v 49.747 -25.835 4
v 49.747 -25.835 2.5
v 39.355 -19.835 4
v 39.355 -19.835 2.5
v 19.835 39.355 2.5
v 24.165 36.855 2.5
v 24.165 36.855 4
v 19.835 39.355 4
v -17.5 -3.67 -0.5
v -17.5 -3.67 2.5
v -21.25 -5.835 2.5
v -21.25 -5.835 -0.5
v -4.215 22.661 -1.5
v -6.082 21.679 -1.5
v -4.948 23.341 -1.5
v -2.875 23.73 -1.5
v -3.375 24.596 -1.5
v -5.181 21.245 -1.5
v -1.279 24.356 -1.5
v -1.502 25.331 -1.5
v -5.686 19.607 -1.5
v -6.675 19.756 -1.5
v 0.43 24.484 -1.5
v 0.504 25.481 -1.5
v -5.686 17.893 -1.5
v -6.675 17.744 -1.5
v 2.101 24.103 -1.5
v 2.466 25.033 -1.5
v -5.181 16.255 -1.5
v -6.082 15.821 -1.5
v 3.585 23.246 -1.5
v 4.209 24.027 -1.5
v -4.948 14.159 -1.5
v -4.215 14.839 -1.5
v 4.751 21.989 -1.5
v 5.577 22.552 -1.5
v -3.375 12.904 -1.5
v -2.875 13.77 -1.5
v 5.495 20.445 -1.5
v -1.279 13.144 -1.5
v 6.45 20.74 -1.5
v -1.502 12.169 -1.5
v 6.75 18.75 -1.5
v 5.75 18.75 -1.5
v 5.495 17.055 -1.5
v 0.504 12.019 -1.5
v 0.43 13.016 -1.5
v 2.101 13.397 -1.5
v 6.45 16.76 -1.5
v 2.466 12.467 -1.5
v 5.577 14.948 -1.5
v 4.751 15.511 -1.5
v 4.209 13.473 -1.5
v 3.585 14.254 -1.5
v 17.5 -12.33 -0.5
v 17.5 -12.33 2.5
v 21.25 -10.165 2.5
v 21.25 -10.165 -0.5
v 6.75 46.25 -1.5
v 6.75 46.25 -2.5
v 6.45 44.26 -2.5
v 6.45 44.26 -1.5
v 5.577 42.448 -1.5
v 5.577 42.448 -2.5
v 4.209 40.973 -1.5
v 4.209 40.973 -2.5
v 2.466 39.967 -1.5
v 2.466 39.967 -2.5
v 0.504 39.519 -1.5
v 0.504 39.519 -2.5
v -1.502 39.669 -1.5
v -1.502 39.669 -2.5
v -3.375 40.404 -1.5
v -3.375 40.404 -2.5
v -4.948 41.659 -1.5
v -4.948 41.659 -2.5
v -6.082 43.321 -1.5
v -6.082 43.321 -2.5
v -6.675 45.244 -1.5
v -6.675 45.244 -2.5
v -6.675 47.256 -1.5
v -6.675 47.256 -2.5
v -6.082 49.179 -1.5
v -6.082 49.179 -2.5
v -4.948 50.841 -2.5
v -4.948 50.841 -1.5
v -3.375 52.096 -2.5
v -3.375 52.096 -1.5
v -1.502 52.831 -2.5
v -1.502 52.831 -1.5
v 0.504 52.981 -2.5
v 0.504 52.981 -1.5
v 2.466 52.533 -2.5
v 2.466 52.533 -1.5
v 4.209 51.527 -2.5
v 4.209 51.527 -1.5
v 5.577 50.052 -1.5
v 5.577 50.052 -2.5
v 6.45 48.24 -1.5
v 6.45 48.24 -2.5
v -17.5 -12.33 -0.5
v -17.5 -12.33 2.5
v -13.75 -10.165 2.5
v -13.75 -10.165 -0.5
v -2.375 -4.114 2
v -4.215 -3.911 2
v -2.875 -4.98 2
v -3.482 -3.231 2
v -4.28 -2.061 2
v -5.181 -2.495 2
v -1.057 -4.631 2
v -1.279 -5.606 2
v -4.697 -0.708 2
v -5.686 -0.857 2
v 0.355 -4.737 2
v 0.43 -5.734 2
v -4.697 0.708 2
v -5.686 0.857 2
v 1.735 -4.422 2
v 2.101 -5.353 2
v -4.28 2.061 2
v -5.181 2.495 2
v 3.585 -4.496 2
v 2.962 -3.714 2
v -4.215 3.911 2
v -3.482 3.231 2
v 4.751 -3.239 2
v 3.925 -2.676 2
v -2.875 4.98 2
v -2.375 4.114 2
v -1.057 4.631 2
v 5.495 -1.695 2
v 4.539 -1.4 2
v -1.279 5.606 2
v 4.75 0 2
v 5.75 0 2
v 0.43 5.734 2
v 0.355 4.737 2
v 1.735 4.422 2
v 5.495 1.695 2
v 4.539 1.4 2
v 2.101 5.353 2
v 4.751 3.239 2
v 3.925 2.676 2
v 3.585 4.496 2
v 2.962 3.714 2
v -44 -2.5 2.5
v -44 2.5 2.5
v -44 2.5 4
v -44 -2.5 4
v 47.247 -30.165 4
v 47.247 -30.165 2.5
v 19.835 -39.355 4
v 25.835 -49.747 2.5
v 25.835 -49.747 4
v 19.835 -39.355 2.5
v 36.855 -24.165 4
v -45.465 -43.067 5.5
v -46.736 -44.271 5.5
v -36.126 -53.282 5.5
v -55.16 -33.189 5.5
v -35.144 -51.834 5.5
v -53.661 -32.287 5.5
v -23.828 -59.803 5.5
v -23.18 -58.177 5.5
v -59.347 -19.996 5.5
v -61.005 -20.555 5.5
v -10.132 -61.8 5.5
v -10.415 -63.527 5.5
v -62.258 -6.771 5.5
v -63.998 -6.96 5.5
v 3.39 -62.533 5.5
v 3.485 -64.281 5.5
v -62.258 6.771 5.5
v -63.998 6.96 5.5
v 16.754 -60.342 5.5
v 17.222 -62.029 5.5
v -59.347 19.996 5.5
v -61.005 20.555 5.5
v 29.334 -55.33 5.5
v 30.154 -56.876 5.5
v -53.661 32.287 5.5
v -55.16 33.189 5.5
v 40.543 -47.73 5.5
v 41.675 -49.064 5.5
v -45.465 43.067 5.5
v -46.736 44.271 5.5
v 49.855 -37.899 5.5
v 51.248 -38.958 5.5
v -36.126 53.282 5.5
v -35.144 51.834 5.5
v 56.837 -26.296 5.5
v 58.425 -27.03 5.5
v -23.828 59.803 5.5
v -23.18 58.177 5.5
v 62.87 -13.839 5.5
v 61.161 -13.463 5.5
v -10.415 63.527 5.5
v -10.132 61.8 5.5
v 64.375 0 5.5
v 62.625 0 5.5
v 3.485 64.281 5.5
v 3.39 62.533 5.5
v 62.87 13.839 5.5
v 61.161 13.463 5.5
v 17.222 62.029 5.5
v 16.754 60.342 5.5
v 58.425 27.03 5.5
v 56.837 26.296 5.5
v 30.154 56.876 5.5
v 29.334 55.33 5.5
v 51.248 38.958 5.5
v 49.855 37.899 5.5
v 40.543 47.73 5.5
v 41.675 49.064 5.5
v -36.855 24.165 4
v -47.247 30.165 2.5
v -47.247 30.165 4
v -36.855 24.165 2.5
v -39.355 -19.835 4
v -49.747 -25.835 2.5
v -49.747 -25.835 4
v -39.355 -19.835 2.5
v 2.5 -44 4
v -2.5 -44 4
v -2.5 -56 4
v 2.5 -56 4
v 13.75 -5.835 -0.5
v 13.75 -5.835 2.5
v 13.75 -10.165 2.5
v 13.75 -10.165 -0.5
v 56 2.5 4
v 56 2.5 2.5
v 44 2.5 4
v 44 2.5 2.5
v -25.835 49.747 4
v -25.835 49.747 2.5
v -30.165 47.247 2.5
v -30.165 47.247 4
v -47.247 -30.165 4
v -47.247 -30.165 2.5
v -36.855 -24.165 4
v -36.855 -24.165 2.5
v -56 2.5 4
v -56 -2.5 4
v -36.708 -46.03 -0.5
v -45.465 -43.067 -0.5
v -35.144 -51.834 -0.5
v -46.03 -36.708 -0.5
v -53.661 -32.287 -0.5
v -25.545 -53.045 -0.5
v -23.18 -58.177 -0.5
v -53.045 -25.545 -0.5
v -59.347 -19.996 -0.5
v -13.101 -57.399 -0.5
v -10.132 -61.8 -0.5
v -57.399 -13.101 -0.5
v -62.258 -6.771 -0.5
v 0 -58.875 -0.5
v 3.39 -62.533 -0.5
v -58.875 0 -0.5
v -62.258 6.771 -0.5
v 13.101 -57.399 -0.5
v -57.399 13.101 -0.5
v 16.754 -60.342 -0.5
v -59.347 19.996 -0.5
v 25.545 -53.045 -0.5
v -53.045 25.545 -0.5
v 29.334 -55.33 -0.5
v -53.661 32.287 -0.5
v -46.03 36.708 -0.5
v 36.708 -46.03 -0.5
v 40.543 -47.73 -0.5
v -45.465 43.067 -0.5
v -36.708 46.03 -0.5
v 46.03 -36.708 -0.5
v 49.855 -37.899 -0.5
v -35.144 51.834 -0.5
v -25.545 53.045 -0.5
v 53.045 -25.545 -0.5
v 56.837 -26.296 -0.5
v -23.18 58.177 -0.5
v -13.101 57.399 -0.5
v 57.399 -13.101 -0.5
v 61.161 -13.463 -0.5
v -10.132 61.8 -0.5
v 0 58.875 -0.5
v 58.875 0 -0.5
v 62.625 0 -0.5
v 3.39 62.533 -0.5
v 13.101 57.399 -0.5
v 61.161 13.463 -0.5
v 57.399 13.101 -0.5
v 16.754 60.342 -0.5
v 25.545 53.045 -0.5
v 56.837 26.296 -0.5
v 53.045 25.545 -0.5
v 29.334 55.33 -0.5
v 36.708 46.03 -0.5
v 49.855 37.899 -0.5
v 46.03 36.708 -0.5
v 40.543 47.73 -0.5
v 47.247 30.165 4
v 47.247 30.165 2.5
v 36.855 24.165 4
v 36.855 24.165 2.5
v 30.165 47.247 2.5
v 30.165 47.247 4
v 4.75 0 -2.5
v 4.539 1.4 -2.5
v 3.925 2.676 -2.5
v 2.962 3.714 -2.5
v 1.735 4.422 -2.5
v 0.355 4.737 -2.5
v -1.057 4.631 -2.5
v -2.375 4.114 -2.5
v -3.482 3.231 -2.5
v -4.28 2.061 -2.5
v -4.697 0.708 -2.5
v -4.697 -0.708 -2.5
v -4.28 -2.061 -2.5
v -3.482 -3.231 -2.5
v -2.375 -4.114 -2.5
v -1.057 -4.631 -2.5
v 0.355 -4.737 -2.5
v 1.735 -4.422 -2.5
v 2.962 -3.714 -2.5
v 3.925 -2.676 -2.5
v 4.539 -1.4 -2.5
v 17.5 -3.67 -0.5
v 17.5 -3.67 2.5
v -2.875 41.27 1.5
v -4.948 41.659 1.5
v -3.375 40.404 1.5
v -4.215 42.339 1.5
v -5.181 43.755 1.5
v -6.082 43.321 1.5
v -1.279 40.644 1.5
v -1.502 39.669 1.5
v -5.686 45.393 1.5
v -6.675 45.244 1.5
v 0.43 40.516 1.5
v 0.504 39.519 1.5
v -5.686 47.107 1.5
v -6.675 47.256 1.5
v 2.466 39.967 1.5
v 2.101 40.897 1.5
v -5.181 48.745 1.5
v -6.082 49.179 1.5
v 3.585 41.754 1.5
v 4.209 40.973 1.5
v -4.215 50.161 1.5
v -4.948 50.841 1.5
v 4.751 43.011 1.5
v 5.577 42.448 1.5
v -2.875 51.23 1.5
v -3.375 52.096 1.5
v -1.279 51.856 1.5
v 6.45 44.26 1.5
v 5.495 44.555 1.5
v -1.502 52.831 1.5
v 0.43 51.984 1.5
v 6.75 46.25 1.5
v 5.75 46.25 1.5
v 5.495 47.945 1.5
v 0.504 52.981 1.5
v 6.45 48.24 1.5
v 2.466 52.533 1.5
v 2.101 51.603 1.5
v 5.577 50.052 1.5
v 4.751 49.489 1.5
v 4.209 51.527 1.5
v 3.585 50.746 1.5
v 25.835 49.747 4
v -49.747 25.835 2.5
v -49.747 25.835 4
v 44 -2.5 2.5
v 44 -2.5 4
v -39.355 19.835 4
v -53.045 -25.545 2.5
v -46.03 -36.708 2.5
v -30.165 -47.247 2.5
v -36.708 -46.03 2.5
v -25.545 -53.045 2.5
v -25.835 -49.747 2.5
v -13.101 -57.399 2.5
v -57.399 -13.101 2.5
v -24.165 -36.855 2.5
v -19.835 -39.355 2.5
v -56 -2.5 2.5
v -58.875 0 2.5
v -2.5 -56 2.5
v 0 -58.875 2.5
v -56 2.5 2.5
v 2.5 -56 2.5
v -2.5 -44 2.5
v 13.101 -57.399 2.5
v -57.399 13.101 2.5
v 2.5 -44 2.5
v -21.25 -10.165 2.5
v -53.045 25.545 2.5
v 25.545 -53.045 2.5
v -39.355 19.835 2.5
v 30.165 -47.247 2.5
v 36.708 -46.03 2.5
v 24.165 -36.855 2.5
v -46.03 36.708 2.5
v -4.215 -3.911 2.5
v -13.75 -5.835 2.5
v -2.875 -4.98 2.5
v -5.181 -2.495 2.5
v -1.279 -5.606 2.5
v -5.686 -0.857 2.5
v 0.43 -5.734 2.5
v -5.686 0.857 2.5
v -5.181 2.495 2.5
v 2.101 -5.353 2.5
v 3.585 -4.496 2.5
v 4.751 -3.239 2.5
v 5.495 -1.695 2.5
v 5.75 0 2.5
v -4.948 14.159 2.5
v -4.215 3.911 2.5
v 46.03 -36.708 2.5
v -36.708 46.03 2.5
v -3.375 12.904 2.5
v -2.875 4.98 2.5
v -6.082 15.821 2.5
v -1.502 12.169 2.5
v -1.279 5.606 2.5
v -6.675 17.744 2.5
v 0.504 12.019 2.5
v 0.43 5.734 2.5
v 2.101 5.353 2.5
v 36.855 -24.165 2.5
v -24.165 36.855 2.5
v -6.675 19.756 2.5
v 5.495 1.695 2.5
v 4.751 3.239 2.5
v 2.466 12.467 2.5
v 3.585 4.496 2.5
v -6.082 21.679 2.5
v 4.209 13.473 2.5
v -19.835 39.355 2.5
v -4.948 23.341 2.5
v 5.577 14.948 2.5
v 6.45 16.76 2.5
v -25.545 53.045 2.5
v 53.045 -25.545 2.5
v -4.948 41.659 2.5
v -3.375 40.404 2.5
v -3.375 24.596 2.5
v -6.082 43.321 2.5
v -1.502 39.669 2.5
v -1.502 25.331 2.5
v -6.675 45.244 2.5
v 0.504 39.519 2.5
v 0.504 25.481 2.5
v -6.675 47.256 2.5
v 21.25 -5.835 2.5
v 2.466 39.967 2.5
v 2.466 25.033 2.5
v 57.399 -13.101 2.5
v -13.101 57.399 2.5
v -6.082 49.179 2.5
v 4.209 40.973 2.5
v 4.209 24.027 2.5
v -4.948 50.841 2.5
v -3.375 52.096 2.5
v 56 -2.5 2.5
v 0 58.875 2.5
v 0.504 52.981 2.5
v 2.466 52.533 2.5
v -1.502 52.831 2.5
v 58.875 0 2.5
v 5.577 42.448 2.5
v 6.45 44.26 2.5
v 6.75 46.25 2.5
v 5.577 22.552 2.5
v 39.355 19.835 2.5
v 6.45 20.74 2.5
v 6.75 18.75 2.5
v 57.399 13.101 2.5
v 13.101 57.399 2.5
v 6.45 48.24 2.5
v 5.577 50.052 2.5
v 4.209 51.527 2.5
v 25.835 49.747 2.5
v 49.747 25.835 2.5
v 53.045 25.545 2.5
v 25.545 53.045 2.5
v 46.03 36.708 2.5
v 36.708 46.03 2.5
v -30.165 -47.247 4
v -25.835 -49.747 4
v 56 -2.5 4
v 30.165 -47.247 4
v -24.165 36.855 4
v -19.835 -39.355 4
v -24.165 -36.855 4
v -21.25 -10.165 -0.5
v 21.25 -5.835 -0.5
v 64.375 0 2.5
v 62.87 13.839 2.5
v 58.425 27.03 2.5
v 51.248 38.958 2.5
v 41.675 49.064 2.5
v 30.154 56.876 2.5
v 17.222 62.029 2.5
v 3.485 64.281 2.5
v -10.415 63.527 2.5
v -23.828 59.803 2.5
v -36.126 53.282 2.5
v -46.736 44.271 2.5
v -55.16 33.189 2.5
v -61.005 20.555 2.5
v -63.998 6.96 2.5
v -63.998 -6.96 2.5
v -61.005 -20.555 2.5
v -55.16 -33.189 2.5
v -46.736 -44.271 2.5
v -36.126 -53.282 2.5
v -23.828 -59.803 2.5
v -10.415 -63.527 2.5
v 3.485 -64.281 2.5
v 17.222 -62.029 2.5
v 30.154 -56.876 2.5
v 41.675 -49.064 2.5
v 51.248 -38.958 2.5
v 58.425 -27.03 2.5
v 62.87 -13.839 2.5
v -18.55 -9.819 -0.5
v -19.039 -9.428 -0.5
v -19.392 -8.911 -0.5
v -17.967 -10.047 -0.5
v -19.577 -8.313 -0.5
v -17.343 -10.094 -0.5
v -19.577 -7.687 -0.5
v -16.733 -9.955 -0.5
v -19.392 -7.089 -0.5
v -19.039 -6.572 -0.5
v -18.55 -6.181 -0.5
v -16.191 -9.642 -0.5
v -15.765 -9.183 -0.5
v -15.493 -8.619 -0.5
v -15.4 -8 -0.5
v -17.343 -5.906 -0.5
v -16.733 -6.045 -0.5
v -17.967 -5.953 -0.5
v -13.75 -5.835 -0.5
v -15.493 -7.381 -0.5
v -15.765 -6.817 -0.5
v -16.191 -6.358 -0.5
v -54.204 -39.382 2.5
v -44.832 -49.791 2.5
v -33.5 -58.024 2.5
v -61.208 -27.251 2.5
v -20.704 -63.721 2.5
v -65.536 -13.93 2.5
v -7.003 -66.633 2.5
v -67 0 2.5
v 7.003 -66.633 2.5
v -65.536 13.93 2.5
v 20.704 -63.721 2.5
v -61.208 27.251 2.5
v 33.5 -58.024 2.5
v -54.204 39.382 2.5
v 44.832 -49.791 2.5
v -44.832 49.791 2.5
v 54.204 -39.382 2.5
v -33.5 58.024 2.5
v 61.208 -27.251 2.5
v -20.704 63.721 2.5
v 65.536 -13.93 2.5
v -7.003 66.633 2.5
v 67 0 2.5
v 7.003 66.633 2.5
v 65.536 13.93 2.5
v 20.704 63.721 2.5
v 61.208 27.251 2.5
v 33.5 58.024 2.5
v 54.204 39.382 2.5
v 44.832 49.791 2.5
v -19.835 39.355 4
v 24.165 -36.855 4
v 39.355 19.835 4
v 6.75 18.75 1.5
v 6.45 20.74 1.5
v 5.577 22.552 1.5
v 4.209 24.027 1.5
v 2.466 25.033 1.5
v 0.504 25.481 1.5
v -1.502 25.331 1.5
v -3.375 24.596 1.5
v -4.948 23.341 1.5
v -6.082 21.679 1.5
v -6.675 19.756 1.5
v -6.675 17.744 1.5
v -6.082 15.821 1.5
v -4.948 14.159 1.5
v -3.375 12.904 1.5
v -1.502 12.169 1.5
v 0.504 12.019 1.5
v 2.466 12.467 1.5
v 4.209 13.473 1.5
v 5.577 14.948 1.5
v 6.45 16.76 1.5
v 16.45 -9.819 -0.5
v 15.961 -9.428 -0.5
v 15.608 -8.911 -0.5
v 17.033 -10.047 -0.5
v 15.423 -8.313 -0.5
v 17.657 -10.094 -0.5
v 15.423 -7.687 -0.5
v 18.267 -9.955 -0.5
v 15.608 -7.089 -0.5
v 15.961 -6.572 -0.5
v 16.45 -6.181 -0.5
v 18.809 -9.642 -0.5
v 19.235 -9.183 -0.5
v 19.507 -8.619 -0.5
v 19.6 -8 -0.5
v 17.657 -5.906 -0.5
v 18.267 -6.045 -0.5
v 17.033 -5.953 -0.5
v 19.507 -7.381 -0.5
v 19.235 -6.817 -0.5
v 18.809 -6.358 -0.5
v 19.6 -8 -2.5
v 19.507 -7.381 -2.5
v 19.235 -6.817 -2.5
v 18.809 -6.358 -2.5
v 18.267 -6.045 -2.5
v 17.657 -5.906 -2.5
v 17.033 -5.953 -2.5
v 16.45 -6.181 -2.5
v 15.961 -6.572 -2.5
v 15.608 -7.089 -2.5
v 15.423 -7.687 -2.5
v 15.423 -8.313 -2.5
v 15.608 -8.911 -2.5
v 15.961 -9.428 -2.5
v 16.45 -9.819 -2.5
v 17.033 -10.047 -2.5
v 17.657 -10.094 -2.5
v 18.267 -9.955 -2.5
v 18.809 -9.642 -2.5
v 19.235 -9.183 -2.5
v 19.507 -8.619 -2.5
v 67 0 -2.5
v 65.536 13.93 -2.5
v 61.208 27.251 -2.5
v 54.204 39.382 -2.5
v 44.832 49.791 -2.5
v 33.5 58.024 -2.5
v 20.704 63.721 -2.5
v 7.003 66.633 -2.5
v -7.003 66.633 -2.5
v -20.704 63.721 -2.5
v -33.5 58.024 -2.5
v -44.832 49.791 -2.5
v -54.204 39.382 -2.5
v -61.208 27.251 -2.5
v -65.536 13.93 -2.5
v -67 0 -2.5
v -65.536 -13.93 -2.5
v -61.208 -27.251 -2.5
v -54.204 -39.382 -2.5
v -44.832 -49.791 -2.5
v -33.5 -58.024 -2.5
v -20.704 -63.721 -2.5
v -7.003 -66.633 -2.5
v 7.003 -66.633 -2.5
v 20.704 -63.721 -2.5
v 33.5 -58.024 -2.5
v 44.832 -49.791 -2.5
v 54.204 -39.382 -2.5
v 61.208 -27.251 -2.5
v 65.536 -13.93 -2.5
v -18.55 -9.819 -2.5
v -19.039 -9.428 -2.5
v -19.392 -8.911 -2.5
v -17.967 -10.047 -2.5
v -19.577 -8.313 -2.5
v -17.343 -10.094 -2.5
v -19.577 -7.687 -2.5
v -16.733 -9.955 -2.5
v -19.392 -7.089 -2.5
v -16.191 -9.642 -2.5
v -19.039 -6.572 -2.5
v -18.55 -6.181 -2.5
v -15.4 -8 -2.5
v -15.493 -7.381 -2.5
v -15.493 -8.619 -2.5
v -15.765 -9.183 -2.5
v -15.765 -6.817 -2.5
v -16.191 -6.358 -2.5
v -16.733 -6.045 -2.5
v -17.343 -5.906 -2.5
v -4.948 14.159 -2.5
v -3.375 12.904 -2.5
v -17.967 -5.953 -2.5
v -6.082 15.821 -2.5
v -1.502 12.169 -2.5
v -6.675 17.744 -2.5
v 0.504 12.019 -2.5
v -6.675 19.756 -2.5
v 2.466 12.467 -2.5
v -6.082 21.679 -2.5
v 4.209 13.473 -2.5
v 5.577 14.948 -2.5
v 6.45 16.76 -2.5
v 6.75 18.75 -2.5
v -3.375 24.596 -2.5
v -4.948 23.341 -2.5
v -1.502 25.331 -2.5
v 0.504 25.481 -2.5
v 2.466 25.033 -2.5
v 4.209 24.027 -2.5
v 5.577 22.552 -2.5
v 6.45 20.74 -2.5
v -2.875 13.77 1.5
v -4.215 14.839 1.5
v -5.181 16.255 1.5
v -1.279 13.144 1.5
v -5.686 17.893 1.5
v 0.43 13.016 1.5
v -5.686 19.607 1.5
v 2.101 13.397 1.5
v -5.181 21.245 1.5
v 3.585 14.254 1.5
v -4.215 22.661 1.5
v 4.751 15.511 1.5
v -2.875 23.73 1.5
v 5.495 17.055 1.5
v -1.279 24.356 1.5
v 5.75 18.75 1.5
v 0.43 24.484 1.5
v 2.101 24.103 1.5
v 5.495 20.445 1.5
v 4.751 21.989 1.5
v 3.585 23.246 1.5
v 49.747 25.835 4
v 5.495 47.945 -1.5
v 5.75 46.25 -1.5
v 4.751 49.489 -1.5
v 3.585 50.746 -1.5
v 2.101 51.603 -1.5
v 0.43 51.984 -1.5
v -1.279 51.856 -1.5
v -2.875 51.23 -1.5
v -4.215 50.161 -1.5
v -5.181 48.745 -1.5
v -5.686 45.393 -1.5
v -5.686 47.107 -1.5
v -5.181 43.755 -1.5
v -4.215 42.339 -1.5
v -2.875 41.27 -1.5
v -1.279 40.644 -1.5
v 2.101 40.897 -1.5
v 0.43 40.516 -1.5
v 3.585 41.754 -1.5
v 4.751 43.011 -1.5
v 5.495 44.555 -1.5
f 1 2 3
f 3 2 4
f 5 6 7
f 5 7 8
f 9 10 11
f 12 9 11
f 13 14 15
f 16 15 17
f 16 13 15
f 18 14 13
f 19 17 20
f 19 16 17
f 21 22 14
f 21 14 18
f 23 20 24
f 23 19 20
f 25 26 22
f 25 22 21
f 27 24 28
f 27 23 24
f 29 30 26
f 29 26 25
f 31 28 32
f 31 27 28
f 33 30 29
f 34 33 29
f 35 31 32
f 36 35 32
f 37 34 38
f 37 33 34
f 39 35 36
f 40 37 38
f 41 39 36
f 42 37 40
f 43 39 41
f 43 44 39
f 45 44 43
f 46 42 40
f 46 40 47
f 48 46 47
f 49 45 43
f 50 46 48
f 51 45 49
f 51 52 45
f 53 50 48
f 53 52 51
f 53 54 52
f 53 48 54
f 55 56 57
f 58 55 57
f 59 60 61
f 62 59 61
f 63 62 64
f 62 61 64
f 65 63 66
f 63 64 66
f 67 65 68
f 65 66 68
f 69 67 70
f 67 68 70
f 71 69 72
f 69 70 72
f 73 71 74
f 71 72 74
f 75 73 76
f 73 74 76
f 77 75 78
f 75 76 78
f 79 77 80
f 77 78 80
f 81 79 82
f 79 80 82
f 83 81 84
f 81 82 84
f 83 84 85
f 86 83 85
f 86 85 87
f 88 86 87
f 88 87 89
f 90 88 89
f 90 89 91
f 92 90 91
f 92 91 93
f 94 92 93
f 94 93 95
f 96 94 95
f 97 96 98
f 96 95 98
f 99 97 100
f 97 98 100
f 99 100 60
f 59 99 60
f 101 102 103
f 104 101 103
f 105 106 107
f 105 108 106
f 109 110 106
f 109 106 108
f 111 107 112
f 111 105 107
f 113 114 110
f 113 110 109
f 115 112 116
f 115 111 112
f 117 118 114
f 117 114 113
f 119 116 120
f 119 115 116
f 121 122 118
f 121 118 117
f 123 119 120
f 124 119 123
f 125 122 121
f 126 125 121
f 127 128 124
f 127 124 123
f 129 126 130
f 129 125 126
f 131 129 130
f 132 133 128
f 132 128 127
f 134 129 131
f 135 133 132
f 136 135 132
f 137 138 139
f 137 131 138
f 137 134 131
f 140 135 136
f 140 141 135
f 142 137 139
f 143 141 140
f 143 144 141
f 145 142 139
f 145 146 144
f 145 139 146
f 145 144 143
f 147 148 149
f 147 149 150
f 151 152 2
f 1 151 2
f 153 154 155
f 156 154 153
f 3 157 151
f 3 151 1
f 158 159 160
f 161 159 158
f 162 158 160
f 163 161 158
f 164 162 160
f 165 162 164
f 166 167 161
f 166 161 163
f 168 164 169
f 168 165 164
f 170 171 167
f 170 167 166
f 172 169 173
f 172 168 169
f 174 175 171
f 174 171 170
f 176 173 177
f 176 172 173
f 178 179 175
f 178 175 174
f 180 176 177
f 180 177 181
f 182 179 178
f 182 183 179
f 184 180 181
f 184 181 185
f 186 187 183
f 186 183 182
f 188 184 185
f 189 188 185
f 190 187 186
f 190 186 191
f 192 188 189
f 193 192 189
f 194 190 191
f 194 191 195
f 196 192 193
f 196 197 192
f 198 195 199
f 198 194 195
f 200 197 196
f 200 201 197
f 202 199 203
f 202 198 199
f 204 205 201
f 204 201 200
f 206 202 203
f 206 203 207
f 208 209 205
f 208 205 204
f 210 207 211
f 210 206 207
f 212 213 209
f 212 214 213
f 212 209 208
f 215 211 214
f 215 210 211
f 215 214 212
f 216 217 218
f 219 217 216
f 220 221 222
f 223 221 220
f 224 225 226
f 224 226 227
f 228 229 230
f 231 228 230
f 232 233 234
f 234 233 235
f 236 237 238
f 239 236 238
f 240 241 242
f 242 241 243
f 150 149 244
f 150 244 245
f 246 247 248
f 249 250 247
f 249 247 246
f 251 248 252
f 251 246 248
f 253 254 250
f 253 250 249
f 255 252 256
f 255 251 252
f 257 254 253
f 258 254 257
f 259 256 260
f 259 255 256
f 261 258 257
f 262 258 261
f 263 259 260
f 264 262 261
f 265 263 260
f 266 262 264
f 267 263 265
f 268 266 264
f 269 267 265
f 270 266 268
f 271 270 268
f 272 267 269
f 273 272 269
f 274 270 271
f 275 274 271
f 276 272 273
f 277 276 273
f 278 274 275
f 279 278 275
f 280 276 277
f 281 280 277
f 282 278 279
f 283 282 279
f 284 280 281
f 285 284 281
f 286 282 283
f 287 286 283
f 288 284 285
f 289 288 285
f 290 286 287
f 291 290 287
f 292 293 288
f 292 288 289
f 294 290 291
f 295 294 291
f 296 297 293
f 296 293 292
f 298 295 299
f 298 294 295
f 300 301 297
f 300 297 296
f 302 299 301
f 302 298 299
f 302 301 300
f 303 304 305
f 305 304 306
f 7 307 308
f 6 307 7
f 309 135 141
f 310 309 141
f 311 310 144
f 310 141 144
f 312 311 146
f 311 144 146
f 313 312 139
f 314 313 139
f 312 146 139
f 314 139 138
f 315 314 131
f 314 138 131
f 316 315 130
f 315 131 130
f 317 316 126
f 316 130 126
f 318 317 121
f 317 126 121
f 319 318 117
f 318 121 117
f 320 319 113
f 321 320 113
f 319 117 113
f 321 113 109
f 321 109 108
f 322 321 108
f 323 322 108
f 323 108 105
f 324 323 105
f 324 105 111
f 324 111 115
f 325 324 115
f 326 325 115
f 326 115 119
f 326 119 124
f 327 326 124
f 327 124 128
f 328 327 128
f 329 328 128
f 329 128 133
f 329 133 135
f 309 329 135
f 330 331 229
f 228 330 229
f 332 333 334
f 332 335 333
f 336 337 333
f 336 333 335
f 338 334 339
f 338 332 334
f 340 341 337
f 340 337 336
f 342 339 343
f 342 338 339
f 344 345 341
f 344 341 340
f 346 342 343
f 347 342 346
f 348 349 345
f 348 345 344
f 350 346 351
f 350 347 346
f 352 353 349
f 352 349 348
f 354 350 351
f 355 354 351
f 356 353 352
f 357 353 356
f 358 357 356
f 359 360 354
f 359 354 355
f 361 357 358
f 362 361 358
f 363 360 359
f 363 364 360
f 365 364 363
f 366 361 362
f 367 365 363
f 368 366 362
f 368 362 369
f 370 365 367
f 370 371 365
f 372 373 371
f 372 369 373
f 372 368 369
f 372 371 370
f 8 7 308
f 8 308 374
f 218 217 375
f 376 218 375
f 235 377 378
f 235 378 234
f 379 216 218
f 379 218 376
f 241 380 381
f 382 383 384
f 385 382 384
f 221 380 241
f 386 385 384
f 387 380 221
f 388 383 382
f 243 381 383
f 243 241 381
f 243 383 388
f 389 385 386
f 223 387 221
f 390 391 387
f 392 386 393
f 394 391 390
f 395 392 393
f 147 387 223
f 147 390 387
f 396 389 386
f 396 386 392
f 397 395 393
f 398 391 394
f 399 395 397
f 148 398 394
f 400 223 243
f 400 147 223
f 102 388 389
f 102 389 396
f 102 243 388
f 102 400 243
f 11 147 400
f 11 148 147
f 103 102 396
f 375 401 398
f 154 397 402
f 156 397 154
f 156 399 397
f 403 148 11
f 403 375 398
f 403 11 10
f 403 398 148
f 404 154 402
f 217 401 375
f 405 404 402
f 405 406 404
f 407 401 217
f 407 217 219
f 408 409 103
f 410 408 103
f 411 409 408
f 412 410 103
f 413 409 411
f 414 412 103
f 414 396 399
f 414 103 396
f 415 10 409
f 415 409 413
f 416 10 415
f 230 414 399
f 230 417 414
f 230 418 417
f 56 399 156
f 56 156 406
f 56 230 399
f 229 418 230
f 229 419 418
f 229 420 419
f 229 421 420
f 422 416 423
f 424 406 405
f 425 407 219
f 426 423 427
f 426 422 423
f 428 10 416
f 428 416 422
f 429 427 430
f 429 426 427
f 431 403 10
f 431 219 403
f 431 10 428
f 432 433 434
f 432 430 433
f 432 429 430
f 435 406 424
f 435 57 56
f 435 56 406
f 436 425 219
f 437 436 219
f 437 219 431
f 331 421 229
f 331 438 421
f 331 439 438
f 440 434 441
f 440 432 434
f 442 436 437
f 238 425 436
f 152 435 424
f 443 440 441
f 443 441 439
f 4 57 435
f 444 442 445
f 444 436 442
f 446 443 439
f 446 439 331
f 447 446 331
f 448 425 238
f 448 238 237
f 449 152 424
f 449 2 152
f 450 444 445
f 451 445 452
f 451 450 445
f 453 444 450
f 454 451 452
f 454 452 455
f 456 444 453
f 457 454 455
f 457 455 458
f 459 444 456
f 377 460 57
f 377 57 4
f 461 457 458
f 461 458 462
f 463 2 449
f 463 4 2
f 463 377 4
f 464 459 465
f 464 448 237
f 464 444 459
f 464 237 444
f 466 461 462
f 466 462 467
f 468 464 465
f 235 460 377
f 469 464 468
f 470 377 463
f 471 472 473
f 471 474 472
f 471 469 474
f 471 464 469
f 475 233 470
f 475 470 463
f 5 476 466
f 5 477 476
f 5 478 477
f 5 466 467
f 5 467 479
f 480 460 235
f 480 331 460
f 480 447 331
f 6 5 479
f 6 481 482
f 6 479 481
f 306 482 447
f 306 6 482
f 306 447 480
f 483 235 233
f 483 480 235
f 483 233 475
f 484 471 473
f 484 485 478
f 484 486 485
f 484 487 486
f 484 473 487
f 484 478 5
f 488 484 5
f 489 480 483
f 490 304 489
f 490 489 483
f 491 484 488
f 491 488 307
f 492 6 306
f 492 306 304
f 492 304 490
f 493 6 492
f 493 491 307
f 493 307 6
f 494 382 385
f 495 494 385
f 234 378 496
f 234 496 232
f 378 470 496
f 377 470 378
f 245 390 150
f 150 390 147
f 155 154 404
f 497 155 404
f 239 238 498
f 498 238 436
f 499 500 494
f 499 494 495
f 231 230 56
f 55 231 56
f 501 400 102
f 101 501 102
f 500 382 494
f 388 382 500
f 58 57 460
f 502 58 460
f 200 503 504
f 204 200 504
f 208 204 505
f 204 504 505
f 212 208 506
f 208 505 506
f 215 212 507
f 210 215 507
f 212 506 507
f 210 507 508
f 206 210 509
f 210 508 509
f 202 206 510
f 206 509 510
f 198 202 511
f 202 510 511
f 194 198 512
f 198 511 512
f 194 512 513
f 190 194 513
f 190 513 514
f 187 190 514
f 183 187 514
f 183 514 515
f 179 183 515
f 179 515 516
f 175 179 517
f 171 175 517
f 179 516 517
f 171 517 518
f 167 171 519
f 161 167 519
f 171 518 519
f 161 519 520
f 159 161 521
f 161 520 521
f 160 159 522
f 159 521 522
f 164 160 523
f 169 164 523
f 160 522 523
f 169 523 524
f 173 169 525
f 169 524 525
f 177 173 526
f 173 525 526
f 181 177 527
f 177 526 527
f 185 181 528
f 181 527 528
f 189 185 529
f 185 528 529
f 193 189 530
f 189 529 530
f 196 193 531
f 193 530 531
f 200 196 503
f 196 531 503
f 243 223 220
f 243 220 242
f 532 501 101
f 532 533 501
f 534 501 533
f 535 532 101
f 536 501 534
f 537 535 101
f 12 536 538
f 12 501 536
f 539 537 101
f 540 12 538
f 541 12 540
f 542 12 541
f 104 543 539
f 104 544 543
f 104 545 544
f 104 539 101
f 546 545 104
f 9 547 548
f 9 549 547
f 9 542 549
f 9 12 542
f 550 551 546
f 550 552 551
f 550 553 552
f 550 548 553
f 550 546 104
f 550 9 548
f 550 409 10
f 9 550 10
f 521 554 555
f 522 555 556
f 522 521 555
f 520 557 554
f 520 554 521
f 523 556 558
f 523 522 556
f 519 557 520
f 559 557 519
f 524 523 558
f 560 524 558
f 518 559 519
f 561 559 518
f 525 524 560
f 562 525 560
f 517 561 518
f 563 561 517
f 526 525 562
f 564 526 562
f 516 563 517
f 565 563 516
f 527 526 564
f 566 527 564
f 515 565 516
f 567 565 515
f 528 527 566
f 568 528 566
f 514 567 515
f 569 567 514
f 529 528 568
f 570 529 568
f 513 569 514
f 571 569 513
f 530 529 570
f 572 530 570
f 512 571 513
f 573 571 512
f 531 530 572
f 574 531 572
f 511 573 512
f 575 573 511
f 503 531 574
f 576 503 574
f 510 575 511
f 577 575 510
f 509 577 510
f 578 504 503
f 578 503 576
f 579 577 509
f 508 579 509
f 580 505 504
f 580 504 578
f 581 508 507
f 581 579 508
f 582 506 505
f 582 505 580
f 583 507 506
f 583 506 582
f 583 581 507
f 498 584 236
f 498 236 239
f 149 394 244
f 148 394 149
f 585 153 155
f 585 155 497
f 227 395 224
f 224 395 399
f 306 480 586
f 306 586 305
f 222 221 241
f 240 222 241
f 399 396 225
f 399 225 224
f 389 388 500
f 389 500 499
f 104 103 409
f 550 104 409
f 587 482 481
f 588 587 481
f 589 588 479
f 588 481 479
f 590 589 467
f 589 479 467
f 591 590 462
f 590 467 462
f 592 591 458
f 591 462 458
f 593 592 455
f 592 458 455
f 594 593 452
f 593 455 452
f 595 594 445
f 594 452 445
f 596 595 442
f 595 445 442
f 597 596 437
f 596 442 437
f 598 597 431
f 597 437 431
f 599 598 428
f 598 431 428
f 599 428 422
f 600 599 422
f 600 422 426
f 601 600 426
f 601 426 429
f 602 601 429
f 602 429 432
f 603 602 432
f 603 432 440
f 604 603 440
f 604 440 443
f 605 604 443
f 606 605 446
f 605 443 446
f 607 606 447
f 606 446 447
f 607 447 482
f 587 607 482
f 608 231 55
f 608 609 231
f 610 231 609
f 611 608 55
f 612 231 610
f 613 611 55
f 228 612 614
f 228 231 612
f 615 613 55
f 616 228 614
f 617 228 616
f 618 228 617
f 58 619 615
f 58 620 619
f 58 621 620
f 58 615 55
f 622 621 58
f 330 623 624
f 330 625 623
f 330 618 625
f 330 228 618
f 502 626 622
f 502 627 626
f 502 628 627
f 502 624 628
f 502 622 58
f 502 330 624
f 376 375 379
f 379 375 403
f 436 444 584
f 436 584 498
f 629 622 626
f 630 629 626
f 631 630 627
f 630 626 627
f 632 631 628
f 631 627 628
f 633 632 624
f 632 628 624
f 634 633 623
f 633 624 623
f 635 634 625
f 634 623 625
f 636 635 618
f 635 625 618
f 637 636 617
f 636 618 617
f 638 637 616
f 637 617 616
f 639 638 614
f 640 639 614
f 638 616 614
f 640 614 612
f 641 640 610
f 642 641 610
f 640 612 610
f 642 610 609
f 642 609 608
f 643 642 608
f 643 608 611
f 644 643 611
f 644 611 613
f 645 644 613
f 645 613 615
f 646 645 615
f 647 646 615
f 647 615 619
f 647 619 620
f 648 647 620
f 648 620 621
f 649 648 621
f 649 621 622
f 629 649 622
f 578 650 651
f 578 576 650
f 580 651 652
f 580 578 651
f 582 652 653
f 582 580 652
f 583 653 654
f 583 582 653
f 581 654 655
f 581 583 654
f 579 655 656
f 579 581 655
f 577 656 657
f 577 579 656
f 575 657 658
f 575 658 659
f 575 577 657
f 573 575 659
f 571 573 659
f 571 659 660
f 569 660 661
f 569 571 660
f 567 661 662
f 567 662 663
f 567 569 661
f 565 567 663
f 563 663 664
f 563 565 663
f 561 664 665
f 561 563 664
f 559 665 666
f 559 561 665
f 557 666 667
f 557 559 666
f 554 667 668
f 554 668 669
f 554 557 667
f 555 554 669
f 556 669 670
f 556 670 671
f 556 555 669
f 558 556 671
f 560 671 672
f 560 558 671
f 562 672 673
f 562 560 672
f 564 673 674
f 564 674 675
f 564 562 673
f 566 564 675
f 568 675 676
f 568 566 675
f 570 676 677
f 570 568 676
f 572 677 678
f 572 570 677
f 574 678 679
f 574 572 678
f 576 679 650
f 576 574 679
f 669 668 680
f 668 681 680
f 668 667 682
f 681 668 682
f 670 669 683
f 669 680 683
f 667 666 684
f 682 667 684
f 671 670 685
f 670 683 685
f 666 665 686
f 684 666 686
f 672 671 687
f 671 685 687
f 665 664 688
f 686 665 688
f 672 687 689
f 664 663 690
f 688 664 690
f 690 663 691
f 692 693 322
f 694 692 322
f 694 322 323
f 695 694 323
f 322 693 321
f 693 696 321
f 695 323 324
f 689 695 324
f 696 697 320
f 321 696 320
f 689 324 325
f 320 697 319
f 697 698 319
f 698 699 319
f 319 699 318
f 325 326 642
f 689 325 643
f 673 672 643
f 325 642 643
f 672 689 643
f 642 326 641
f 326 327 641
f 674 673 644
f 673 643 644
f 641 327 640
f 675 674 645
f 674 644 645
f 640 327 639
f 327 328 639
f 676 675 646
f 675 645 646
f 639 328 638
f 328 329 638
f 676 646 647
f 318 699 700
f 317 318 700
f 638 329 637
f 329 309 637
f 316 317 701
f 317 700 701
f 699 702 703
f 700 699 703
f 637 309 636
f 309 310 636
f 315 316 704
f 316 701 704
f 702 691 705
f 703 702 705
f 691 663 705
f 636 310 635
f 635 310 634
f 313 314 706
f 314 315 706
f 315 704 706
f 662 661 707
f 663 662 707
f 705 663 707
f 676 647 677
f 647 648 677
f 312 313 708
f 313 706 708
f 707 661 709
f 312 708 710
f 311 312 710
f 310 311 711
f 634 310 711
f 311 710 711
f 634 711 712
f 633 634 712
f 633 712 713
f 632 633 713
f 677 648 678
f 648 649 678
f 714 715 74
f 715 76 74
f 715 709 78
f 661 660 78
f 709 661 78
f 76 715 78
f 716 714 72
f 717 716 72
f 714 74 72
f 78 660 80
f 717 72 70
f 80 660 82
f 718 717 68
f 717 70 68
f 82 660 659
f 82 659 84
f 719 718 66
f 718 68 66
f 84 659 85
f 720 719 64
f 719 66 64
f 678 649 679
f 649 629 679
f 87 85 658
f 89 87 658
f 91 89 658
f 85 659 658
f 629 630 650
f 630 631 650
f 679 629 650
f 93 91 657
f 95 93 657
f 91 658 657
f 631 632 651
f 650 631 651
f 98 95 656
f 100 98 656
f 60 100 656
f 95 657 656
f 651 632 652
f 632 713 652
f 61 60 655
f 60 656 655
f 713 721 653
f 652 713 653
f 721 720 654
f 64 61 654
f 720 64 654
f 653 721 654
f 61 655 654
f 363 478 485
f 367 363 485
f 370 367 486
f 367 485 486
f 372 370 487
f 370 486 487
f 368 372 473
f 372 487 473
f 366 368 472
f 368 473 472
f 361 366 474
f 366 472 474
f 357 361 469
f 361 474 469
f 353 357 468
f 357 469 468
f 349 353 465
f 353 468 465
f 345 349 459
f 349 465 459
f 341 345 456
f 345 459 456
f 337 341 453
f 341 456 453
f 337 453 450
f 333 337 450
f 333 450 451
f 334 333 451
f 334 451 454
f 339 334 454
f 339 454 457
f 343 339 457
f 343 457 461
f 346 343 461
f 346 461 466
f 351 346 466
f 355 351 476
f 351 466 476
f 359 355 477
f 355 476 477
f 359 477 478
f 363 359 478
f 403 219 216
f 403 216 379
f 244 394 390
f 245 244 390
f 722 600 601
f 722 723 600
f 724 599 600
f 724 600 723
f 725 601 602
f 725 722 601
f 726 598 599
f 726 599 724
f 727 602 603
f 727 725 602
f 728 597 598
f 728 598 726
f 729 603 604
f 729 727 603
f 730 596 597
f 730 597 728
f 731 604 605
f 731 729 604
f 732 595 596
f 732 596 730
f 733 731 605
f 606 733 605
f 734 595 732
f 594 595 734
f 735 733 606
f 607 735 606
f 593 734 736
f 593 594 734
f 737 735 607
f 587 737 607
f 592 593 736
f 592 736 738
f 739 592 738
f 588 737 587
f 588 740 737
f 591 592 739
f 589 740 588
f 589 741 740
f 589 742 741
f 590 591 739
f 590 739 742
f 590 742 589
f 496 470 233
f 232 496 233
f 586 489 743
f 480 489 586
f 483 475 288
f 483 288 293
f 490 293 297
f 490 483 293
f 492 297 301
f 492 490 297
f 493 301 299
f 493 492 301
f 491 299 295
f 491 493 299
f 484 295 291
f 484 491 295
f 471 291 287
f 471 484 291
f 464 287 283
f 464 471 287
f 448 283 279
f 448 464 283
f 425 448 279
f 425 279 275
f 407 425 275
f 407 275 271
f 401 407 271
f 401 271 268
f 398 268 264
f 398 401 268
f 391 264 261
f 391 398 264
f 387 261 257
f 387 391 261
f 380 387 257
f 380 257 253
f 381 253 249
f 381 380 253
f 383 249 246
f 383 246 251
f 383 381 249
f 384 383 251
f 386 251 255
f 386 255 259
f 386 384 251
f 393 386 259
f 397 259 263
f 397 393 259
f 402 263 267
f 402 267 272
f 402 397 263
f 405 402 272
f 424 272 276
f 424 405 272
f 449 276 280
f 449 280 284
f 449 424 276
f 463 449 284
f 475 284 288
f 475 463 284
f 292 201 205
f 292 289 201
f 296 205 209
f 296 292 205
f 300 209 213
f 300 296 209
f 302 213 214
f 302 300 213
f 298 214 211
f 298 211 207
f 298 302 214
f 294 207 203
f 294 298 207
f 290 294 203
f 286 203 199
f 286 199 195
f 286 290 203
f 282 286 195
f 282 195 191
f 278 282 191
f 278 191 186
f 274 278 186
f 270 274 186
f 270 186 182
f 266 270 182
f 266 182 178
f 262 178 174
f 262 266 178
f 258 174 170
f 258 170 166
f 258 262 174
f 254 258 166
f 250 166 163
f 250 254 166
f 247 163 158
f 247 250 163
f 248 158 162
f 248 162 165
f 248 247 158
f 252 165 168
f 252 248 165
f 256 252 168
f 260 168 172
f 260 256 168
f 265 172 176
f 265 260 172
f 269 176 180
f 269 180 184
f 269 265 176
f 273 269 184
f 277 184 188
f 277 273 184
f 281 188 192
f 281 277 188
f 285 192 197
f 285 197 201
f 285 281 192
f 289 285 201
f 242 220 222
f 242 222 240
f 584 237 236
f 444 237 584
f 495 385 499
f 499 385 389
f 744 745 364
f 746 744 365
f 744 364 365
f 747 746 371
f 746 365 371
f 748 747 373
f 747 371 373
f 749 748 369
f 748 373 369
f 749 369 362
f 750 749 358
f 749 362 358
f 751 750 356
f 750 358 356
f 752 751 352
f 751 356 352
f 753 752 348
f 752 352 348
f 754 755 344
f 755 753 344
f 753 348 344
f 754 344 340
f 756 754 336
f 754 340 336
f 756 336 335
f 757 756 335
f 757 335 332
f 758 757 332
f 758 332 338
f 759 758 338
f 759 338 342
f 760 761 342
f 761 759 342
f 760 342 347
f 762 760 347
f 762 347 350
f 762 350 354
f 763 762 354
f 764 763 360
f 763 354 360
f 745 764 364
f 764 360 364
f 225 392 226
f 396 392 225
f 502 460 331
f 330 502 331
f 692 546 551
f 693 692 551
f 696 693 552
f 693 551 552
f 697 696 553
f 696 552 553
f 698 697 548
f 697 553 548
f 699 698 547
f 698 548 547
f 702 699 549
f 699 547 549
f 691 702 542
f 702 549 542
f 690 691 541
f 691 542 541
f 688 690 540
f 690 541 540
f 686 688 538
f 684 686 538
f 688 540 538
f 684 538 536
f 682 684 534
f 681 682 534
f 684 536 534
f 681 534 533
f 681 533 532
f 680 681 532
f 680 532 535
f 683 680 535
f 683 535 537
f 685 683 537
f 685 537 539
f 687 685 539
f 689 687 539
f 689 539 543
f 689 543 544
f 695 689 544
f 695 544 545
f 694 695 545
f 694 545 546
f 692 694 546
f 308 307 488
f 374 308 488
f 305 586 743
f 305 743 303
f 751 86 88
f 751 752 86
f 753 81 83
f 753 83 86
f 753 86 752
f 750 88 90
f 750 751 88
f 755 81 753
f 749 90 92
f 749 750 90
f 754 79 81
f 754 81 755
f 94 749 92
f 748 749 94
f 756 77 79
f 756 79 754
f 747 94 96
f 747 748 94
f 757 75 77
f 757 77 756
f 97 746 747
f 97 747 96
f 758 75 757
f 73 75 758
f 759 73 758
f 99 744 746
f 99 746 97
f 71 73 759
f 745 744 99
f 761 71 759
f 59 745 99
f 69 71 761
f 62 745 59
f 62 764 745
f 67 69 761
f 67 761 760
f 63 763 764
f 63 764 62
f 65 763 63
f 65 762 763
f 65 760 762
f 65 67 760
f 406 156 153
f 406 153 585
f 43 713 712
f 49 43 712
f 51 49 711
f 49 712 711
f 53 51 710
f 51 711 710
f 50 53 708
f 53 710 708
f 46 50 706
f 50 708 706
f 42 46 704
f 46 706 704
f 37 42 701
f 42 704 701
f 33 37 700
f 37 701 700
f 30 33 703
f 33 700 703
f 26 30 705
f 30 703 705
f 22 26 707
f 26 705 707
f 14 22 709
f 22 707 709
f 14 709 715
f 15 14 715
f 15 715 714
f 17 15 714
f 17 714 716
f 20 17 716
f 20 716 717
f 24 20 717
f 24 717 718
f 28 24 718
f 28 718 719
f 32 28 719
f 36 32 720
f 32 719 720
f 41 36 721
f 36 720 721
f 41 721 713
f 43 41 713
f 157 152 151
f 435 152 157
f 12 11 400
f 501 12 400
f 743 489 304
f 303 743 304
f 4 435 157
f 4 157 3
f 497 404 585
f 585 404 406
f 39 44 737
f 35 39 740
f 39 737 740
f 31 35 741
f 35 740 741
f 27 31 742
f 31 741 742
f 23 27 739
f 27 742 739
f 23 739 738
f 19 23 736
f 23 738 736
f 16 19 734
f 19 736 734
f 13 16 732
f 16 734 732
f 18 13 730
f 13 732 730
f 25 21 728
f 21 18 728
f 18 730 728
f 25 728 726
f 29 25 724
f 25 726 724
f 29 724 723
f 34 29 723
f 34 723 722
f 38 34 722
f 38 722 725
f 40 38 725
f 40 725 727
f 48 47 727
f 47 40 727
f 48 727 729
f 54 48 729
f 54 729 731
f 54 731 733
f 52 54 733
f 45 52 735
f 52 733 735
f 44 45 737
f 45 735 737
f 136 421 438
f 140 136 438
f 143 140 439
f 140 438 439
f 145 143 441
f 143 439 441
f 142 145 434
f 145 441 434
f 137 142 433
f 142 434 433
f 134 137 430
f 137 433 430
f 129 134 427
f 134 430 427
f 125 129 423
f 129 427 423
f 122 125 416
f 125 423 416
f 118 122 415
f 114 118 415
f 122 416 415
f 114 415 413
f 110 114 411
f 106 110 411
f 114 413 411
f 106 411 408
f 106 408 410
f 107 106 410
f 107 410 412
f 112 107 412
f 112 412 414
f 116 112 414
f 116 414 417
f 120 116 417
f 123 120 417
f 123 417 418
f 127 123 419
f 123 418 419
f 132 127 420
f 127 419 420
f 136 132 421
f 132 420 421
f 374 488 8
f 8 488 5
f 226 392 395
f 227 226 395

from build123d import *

# Parameters (mm, degrees)
F0_R      = 67
F1_DEPTH  = 2.5
F2_R      = 64.375
F2_R_2    = 62.625
F3_DEPTH  = 3
F4_R      = 4.75
F4_R_2    = 5.75
F4_R_3    = 2.1
F5_DEPTH  = 5.001
F6_R      = 5.75
F7_DEPTH  = 0.5
F6_R_2    = 6.75
F8_DEPTH  = 1
F2_R_3    = 58.875
F9_DEPTH  = 3
F10_R     = 6.75
F10_R_2   = 5.75
F11_DEPTH = 1
F13_W     = 5
F13_H     = 12
F14_DEPTH = 1.5
F15_COUNT = 6
F15_ANGLE = 150
F16_COUNT = 6
F16_ANGLE = 150
F17_DEPTH = 3


with BuildPart() as f1:
    # F0 (on Top) → F1 (new body, symmetric)
    with BuildSketch(Plane.XY):
        Circle(F0_R)
    extrude(amount=F1_DEPTH, both=True)

    # F2 (on face) → F3 (join)
    with BuildSketch(Plane.XY.offset(2.5)):
        Circle(F2_R)
        Circle(F2_R_2, mode=Mode.SUBTRACT)
    extrude(amount=F3_DEPTH)

    # F4 (on face) → F5 (cut, through all)
    with BuildSketch(Plane.XY.offset(2.5)):
        Circle(F4_R)
        with Locations((0, 18.75)):
            Circle(F4_R_2)
        with Locations((0, 46.25)):
            Circle(F4_R_2)
        with Locations((17.5, -8)):
            Circle(F4_R_3)
        with Locations((-17.5, -8)):
            Circle(F4_R_3)
    extrude(amount=-F5_DEPTH, mode=Mode.SUBTRACT)

    # F6 (on face) → F7 (cut)
    with BuildSketch(Plane.XY.offset(2.5)):
        Circle(F6_R)
    extrude(amount=-F7_DEPTH, mode=Mode.SUBTRACT)

    # F6 (on face) → F8 (cut)
    with BuildSketch(Plane.XY.offset(2.5)):
        with Locations((0, 18.75)):
            Circle(F6_R_2)
        with Locations((0, 46.25)):
            Circle(F6_R_2)
    extrude(amount=-F8_DEPTH, mode=Mode.SUBTRACT)

    # F2 (on face) → F9 (cut)
    with BuildSketch(Plane.XY.offset(2.5)):
        Circle(F2_R_2)
        Circle(F2_R_3, mode=Mode.SUBTRACT)
    extrude(amount=-F9_DEPTH, mode=Mode.SUBTRACT)

    # F10 (on face) → F11 (cut)
    with BuildSketch(Plane(origin=(0, 0, -2.5), x_dir=(1, 0, 0), z_dir=(0, 0, -1))):
        with Locations((0, -18.75)):
            Circle(F10_R)
        with Locations((0, -18.75)):
            Circle(F10_R_2, mode=Mode.SUBTRACT)
        with Locations((0, -46.25)):
            Circle(F10_R)
        with Locations((0, -46.25)):
            Circle(F10_R_2, mode=Mode.SUBTRACT)
    extrude(amount=-F11_DEPTH, mode=Mode.SUBTRACT)

    # F13 (on face) → F14 (join)
    with BuildSketch(Plane.XY.offset(2.5)):
        with Locations((0, -50)):
            Rectangle(F13_W, F13_H)
    f14 = extrude(amount=F14_DEPTH)

    # F15: F14 ×6 about axis
    f15_axis = Axis((0, 0, 2.5), (0, 0, 1))
    for i in range(1, F15_COUNT):
        add(f14.rotate(f15_axis, i * F15_ANGLE / (F15_COUNT - 1)))

    # F16: F14 ×6 about axis
    f16_axis = Axis((0, 0, 2.5), (0, 0, -1))
    for i in range(1, F16_COUNT):
        add(f14.rotate(f16_axis, i * F16_ANGLE / (F16_COUNT - 1)))

    # F6 (on face) → F17 (cut)
    with BuildSketch(Plane.XY.offset(2.5)):
        Polygon((-13.75, -10.1650635095), (-13.75, -5.8349364905), (-17.5, -3.6698729811), (-21.25, -5.8349364905), (-21.25, -10.1650635095), (-17.5, -12.3301270189), align=None)
        Polygon((21.25, -10.1650635095), (21.25, -5.8349364905), (17.5, -3.6698729811), (13.75, -5.8349364905), (13.75, -10.1650635095), (17.5, -12.3301270189), align=None)
    extrude(amount=-F17_DEPTH, mode=Mode.SUBTRACT)


solid = f1.part
